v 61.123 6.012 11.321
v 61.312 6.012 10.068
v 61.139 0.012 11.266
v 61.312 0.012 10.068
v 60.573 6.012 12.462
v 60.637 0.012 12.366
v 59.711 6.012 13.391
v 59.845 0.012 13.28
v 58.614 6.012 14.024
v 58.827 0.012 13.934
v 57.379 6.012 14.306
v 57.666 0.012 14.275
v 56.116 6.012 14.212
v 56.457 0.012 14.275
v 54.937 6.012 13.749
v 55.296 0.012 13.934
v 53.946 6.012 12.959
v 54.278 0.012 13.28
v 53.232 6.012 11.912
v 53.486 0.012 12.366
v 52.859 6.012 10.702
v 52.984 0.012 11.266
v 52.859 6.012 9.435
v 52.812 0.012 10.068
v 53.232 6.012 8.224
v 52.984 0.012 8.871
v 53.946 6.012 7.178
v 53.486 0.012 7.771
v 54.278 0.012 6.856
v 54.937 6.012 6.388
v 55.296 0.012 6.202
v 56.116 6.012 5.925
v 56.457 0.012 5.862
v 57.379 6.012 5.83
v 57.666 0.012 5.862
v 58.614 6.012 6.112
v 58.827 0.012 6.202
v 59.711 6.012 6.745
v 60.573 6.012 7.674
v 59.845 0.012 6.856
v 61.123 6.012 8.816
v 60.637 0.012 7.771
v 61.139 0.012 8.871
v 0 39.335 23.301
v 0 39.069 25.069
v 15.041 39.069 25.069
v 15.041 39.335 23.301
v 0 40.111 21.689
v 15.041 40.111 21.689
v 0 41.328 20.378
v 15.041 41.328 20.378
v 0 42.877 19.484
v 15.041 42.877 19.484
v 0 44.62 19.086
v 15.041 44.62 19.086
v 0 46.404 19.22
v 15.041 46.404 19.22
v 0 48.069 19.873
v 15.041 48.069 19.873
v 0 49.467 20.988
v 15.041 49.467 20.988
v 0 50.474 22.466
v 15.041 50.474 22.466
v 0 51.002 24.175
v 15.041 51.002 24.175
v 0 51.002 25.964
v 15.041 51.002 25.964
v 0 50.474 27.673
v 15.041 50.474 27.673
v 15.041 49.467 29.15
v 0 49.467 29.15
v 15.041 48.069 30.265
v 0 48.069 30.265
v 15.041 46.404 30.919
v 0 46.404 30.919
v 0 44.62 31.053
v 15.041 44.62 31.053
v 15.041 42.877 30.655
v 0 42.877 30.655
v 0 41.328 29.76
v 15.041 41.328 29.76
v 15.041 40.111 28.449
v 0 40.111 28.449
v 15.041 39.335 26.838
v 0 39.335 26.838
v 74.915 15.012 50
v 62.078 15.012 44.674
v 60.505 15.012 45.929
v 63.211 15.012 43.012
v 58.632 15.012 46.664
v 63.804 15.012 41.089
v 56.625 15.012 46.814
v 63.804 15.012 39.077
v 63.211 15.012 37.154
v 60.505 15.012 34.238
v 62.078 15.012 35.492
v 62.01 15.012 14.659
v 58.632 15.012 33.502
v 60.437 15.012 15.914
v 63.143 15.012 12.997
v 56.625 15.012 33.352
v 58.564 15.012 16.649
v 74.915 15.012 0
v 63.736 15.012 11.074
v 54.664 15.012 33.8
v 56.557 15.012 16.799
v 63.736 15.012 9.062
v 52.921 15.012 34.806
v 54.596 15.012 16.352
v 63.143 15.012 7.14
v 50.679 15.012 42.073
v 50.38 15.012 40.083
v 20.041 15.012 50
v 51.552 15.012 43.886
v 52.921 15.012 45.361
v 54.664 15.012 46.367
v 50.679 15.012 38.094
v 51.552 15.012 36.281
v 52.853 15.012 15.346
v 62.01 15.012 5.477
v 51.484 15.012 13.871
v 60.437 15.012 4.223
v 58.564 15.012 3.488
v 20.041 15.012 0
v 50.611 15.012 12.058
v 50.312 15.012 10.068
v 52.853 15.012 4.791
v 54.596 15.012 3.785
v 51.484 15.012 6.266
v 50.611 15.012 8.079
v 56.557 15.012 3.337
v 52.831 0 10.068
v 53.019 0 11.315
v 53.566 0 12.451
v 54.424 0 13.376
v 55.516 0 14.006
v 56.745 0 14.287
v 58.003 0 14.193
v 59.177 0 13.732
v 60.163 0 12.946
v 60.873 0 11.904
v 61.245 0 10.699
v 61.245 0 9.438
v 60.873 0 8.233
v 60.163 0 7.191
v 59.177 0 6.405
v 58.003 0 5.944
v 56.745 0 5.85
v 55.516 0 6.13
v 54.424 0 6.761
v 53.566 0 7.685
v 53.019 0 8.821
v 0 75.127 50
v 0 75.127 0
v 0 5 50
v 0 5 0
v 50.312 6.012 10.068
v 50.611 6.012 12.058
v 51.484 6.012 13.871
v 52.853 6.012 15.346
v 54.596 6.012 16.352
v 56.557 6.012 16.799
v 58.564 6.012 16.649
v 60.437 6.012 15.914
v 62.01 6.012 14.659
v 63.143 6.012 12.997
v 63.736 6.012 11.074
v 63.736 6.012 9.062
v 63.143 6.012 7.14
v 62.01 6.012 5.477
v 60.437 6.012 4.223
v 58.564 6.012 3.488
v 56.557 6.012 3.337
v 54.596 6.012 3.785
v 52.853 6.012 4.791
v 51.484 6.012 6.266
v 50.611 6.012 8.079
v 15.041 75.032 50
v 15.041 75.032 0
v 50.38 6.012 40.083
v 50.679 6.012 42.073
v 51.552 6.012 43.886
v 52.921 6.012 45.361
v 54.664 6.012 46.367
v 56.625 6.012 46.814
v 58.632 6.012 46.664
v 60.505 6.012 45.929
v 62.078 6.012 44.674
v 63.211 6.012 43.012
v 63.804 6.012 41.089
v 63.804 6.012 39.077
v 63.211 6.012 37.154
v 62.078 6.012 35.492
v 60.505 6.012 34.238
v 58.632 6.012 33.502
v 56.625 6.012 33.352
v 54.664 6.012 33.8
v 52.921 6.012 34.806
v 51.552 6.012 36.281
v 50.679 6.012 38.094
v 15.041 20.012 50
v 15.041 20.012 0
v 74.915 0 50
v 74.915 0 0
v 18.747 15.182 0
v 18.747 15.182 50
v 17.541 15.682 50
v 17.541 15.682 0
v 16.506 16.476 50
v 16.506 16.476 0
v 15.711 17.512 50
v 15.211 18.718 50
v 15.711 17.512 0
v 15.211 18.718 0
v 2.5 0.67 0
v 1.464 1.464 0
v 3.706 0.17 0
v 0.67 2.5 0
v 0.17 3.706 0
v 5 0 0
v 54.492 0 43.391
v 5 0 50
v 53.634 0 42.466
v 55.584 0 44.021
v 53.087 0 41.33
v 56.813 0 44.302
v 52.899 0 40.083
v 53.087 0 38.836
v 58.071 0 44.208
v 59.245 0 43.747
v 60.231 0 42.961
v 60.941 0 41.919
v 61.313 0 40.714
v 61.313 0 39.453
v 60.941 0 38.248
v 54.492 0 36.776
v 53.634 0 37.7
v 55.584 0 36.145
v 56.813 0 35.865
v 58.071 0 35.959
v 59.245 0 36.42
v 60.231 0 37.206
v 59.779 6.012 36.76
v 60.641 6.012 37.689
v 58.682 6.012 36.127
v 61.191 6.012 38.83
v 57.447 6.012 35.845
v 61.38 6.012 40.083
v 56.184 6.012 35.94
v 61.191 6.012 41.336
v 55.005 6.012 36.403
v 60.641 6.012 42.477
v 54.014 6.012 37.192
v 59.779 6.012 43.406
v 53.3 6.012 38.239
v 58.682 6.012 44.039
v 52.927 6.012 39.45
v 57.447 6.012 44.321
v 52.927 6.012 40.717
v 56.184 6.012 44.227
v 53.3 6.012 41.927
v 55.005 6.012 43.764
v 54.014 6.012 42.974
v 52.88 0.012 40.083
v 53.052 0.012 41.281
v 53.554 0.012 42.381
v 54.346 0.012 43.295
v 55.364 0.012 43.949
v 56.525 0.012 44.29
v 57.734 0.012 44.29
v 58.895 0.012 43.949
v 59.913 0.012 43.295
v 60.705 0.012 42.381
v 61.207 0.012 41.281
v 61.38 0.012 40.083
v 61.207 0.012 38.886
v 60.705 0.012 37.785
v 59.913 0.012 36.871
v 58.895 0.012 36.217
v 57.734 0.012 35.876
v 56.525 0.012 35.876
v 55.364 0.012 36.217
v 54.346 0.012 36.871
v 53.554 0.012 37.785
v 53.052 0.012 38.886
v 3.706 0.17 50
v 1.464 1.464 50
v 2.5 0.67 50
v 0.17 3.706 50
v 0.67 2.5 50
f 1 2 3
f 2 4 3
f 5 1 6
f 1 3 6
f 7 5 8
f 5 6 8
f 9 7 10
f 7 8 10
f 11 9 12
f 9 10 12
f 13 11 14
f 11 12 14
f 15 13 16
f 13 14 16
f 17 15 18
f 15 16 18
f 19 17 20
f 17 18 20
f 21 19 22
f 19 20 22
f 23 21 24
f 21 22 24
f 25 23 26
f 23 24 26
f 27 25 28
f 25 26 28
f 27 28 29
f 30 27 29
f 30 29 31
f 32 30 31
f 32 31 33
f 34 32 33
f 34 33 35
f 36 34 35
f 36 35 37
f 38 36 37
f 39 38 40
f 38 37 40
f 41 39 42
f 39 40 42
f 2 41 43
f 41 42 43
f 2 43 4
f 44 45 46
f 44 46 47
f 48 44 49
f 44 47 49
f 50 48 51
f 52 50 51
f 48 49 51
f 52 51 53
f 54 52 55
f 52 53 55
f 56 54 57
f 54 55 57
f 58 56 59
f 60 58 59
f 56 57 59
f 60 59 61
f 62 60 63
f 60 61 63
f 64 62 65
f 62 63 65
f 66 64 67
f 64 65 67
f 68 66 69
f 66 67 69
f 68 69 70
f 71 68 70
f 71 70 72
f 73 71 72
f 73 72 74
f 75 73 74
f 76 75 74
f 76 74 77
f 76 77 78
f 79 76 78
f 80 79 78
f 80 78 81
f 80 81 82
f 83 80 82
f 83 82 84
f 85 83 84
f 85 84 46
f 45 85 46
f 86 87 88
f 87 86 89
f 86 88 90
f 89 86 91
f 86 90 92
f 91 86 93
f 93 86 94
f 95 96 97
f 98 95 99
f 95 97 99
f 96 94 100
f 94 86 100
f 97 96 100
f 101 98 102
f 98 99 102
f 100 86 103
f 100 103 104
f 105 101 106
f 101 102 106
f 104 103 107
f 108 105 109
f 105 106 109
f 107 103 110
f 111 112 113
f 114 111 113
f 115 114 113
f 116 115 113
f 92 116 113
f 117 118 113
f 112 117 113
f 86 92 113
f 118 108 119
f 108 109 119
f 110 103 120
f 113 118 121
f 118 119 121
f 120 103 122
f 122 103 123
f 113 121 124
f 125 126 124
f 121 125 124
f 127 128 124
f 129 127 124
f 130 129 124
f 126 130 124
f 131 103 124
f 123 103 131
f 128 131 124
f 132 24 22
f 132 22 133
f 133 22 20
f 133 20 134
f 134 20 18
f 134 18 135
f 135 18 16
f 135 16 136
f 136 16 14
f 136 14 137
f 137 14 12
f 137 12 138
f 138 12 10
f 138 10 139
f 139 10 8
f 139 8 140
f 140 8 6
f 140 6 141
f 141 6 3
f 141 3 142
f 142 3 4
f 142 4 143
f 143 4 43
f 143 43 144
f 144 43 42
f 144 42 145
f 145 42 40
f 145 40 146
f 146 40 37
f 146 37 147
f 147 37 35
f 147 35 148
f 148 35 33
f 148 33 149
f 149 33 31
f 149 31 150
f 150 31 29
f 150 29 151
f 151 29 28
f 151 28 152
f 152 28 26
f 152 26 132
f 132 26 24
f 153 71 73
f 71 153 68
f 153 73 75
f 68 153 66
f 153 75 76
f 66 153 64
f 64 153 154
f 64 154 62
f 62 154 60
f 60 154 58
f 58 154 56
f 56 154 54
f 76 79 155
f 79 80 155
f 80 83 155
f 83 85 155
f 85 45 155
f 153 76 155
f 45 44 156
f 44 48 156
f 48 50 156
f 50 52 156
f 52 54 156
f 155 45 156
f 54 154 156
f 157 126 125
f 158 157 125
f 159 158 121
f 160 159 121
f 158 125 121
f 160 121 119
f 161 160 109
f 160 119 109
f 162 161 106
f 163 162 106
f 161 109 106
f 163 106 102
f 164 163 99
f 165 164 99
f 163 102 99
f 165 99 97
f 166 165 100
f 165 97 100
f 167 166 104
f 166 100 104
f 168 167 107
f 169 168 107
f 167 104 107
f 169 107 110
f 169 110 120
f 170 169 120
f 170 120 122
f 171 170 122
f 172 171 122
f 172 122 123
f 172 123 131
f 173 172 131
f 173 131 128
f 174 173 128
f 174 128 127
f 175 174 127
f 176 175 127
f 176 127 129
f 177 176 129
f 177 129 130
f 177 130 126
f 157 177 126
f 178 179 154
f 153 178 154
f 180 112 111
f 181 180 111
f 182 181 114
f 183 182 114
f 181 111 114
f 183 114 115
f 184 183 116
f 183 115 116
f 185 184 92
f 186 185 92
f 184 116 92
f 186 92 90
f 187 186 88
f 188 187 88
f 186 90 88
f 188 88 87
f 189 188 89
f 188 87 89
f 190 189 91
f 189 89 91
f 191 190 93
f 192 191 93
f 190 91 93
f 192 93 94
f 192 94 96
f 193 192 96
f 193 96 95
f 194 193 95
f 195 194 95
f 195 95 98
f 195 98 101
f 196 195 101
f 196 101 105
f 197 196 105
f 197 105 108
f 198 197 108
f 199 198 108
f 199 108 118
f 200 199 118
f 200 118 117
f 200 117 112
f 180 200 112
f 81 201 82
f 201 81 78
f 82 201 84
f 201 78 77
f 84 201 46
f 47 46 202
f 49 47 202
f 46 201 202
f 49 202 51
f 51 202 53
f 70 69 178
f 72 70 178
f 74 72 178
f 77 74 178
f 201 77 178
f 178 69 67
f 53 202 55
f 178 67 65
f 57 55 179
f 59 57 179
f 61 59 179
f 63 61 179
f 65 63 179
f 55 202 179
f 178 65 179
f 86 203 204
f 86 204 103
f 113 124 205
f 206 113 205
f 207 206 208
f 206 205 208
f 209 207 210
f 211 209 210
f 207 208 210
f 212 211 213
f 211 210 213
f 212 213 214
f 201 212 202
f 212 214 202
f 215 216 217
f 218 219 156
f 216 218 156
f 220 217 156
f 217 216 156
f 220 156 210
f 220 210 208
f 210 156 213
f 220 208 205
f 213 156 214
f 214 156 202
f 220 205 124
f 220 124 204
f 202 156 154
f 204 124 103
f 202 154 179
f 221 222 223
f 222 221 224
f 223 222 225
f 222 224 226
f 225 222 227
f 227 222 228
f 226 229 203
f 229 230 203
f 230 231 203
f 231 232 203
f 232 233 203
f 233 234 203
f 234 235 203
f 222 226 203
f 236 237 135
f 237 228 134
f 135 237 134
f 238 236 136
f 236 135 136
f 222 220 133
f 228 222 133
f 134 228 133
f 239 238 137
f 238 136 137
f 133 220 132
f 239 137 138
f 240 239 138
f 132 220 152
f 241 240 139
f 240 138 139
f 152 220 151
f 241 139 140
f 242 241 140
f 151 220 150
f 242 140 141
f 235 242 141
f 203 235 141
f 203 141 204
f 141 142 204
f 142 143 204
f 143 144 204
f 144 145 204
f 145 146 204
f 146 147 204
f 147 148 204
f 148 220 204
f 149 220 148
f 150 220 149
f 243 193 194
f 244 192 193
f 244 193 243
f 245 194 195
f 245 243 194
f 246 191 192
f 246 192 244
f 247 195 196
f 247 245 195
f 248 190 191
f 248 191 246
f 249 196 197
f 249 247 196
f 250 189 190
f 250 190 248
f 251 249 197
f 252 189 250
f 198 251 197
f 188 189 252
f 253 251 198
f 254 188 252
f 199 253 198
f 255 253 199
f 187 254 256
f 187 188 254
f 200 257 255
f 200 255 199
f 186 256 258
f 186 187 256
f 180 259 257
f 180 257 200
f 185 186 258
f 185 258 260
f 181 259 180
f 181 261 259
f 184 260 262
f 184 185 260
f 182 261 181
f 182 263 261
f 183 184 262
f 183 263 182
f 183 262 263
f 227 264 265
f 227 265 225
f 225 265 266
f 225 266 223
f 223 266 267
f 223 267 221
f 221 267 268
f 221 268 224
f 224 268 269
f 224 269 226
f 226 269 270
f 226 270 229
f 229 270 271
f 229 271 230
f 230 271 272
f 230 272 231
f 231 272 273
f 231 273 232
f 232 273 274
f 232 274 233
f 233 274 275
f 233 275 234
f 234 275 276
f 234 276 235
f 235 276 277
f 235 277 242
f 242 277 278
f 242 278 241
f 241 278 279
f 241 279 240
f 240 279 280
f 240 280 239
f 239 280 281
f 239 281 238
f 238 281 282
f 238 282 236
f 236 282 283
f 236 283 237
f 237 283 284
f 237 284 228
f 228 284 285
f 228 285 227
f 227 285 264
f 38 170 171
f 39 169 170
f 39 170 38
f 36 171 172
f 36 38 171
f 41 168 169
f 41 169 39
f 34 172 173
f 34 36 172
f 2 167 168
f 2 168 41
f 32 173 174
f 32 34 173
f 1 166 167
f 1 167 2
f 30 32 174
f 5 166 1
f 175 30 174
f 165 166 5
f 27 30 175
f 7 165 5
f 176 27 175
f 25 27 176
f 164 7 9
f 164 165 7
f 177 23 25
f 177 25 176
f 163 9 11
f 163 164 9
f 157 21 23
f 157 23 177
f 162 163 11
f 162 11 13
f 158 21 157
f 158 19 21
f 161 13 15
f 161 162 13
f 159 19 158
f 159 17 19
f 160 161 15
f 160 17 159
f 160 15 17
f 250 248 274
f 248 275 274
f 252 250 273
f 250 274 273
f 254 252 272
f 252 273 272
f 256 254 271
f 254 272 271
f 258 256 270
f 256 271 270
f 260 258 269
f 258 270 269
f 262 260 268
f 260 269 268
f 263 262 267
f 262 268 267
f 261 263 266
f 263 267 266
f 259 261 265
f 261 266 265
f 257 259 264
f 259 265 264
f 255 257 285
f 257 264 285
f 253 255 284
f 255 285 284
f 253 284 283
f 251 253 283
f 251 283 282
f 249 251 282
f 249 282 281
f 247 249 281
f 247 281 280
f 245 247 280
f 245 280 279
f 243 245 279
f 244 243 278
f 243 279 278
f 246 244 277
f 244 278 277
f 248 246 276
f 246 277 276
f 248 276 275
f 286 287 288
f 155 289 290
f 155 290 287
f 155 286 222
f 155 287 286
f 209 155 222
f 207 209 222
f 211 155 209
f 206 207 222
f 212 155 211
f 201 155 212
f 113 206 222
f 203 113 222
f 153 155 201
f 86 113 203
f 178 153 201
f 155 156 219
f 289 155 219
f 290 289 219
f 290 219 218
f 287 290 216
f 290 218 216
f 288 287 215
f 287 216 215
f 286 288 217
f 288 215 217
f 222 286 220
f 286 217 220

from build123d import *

# Parameters (mm, degrees)
F0_W           = 15.0410700589
F0_H           = 23.9910148084
F1_DEPTH       = 50
F3_D           = 12
F5_D           = 8.5
F5_DEPTH       = 15
F5_CBORE_D     = 13.5
F5_CBORE_DEPTH = 9
F5_TIP         = 2.5536576309


with BuildPart() as f1:
    # F0 (on Top) → F1 (new body)
    with BuildSketch(Plane.XY):
        with BuildLine():
            Line((0, 39.0400364995), (0, 5))
            ThreePointArc((0, 5), (1.4644660941, 1.4644660941), (5, 0))
            Line((5, 0), (52.6695400476, 0))
            Line((52.6695400476, 0), (52.6695400476, 6.0573876835))
            Line((52.6695400476, 6.0573876835), (50.1525513828, 6.0573876835))
            Line((50.1525513828, 6.0573876835), (50.1525513828, 15.0117706507))
            Line((50.1525513828, 15.0117706507), (20.0410700589, 15.0117706507))
            ThreePointArc((20.0410700589, 15.0117706507), (16.505536153, 16.4762367448), (15.0410700589, 20.0117706507))
            Line((15.0410700589, 20.0117706507), (15.0410700589, 25.0367524475))
            Line((15.0410700589, 25.0367524475), (15.0410700589, 39.0400364995))
            Line((15.0410700589, 39.0400364995), (0, 39.0400364995))
        make_face()
        Polygon((0, 45.056425035), (0, 39.0400364995), (15.0410700589, 39.0400364995), (15.0410700589, 45.056425035), (15.0410700589, 51.040943712), (0, 51.040943712), align=None)
        Polygon((52.6695400476, 6.0573876835), (52.6695400476, 0), (56.8805225194, 0), (61.0882826149, 0), (61.0882826149, 6.0573876835), (63.6130347848, 6.0573876835), (63.6130347848, 15.0117706507), (50.1525513828, 15.0117706507), (50.1525513828, 6.0573876835), align=None)
        with Locations((7.5205350295, 63.0364511162)):
            Rectangle(F0_W, F0_H)
        Polygon((0, 75.1270577312), (0, 75.0319585204), (15.0410700589, 75.0319585204), align=None)
        Polygon((61.0882826149, 6.0573876835), (61.0882826149, 0), (74.9153345823, 0), (74.9153345823, 15.0117706507), (63.6130347848, 15.0117706507), (63.6130347848, 6.0573876835), align=None)
    extrude(amount=F1_DEPTH)

    # F3 (through all)
    with Locations(Plane(origin=(0, 0, 0), x_dir=(0, 1, 0), z_dir=(-1, 0, 0))):
        with Locations((45.0686700642, -25.0693447888)):
            Hole(F3_D / 2)

    # F5
    with Locations(Plane(origin=(0, 15.0117706507, 0), x_dir=(-1, 0, 0), z_dir=(0, 1, 0))):
        with Locations((-57.1296028793, 40.0831848383), (-57.0615939796, 10.0682657212)):
            CounterBoreHole(F5_D / 2, F5_CBORE_D / 2, F5_CBORE_DEPTH, depth=F5_DEPTH)
            with Locations((0, 0, -(F5_DEPTH + F5_TIP / 2))):  # 118° drill point
                Cone(0, F5_D / 2, F5_TIP, mode=Mode.SUBTRACT)


solid = f1.part
